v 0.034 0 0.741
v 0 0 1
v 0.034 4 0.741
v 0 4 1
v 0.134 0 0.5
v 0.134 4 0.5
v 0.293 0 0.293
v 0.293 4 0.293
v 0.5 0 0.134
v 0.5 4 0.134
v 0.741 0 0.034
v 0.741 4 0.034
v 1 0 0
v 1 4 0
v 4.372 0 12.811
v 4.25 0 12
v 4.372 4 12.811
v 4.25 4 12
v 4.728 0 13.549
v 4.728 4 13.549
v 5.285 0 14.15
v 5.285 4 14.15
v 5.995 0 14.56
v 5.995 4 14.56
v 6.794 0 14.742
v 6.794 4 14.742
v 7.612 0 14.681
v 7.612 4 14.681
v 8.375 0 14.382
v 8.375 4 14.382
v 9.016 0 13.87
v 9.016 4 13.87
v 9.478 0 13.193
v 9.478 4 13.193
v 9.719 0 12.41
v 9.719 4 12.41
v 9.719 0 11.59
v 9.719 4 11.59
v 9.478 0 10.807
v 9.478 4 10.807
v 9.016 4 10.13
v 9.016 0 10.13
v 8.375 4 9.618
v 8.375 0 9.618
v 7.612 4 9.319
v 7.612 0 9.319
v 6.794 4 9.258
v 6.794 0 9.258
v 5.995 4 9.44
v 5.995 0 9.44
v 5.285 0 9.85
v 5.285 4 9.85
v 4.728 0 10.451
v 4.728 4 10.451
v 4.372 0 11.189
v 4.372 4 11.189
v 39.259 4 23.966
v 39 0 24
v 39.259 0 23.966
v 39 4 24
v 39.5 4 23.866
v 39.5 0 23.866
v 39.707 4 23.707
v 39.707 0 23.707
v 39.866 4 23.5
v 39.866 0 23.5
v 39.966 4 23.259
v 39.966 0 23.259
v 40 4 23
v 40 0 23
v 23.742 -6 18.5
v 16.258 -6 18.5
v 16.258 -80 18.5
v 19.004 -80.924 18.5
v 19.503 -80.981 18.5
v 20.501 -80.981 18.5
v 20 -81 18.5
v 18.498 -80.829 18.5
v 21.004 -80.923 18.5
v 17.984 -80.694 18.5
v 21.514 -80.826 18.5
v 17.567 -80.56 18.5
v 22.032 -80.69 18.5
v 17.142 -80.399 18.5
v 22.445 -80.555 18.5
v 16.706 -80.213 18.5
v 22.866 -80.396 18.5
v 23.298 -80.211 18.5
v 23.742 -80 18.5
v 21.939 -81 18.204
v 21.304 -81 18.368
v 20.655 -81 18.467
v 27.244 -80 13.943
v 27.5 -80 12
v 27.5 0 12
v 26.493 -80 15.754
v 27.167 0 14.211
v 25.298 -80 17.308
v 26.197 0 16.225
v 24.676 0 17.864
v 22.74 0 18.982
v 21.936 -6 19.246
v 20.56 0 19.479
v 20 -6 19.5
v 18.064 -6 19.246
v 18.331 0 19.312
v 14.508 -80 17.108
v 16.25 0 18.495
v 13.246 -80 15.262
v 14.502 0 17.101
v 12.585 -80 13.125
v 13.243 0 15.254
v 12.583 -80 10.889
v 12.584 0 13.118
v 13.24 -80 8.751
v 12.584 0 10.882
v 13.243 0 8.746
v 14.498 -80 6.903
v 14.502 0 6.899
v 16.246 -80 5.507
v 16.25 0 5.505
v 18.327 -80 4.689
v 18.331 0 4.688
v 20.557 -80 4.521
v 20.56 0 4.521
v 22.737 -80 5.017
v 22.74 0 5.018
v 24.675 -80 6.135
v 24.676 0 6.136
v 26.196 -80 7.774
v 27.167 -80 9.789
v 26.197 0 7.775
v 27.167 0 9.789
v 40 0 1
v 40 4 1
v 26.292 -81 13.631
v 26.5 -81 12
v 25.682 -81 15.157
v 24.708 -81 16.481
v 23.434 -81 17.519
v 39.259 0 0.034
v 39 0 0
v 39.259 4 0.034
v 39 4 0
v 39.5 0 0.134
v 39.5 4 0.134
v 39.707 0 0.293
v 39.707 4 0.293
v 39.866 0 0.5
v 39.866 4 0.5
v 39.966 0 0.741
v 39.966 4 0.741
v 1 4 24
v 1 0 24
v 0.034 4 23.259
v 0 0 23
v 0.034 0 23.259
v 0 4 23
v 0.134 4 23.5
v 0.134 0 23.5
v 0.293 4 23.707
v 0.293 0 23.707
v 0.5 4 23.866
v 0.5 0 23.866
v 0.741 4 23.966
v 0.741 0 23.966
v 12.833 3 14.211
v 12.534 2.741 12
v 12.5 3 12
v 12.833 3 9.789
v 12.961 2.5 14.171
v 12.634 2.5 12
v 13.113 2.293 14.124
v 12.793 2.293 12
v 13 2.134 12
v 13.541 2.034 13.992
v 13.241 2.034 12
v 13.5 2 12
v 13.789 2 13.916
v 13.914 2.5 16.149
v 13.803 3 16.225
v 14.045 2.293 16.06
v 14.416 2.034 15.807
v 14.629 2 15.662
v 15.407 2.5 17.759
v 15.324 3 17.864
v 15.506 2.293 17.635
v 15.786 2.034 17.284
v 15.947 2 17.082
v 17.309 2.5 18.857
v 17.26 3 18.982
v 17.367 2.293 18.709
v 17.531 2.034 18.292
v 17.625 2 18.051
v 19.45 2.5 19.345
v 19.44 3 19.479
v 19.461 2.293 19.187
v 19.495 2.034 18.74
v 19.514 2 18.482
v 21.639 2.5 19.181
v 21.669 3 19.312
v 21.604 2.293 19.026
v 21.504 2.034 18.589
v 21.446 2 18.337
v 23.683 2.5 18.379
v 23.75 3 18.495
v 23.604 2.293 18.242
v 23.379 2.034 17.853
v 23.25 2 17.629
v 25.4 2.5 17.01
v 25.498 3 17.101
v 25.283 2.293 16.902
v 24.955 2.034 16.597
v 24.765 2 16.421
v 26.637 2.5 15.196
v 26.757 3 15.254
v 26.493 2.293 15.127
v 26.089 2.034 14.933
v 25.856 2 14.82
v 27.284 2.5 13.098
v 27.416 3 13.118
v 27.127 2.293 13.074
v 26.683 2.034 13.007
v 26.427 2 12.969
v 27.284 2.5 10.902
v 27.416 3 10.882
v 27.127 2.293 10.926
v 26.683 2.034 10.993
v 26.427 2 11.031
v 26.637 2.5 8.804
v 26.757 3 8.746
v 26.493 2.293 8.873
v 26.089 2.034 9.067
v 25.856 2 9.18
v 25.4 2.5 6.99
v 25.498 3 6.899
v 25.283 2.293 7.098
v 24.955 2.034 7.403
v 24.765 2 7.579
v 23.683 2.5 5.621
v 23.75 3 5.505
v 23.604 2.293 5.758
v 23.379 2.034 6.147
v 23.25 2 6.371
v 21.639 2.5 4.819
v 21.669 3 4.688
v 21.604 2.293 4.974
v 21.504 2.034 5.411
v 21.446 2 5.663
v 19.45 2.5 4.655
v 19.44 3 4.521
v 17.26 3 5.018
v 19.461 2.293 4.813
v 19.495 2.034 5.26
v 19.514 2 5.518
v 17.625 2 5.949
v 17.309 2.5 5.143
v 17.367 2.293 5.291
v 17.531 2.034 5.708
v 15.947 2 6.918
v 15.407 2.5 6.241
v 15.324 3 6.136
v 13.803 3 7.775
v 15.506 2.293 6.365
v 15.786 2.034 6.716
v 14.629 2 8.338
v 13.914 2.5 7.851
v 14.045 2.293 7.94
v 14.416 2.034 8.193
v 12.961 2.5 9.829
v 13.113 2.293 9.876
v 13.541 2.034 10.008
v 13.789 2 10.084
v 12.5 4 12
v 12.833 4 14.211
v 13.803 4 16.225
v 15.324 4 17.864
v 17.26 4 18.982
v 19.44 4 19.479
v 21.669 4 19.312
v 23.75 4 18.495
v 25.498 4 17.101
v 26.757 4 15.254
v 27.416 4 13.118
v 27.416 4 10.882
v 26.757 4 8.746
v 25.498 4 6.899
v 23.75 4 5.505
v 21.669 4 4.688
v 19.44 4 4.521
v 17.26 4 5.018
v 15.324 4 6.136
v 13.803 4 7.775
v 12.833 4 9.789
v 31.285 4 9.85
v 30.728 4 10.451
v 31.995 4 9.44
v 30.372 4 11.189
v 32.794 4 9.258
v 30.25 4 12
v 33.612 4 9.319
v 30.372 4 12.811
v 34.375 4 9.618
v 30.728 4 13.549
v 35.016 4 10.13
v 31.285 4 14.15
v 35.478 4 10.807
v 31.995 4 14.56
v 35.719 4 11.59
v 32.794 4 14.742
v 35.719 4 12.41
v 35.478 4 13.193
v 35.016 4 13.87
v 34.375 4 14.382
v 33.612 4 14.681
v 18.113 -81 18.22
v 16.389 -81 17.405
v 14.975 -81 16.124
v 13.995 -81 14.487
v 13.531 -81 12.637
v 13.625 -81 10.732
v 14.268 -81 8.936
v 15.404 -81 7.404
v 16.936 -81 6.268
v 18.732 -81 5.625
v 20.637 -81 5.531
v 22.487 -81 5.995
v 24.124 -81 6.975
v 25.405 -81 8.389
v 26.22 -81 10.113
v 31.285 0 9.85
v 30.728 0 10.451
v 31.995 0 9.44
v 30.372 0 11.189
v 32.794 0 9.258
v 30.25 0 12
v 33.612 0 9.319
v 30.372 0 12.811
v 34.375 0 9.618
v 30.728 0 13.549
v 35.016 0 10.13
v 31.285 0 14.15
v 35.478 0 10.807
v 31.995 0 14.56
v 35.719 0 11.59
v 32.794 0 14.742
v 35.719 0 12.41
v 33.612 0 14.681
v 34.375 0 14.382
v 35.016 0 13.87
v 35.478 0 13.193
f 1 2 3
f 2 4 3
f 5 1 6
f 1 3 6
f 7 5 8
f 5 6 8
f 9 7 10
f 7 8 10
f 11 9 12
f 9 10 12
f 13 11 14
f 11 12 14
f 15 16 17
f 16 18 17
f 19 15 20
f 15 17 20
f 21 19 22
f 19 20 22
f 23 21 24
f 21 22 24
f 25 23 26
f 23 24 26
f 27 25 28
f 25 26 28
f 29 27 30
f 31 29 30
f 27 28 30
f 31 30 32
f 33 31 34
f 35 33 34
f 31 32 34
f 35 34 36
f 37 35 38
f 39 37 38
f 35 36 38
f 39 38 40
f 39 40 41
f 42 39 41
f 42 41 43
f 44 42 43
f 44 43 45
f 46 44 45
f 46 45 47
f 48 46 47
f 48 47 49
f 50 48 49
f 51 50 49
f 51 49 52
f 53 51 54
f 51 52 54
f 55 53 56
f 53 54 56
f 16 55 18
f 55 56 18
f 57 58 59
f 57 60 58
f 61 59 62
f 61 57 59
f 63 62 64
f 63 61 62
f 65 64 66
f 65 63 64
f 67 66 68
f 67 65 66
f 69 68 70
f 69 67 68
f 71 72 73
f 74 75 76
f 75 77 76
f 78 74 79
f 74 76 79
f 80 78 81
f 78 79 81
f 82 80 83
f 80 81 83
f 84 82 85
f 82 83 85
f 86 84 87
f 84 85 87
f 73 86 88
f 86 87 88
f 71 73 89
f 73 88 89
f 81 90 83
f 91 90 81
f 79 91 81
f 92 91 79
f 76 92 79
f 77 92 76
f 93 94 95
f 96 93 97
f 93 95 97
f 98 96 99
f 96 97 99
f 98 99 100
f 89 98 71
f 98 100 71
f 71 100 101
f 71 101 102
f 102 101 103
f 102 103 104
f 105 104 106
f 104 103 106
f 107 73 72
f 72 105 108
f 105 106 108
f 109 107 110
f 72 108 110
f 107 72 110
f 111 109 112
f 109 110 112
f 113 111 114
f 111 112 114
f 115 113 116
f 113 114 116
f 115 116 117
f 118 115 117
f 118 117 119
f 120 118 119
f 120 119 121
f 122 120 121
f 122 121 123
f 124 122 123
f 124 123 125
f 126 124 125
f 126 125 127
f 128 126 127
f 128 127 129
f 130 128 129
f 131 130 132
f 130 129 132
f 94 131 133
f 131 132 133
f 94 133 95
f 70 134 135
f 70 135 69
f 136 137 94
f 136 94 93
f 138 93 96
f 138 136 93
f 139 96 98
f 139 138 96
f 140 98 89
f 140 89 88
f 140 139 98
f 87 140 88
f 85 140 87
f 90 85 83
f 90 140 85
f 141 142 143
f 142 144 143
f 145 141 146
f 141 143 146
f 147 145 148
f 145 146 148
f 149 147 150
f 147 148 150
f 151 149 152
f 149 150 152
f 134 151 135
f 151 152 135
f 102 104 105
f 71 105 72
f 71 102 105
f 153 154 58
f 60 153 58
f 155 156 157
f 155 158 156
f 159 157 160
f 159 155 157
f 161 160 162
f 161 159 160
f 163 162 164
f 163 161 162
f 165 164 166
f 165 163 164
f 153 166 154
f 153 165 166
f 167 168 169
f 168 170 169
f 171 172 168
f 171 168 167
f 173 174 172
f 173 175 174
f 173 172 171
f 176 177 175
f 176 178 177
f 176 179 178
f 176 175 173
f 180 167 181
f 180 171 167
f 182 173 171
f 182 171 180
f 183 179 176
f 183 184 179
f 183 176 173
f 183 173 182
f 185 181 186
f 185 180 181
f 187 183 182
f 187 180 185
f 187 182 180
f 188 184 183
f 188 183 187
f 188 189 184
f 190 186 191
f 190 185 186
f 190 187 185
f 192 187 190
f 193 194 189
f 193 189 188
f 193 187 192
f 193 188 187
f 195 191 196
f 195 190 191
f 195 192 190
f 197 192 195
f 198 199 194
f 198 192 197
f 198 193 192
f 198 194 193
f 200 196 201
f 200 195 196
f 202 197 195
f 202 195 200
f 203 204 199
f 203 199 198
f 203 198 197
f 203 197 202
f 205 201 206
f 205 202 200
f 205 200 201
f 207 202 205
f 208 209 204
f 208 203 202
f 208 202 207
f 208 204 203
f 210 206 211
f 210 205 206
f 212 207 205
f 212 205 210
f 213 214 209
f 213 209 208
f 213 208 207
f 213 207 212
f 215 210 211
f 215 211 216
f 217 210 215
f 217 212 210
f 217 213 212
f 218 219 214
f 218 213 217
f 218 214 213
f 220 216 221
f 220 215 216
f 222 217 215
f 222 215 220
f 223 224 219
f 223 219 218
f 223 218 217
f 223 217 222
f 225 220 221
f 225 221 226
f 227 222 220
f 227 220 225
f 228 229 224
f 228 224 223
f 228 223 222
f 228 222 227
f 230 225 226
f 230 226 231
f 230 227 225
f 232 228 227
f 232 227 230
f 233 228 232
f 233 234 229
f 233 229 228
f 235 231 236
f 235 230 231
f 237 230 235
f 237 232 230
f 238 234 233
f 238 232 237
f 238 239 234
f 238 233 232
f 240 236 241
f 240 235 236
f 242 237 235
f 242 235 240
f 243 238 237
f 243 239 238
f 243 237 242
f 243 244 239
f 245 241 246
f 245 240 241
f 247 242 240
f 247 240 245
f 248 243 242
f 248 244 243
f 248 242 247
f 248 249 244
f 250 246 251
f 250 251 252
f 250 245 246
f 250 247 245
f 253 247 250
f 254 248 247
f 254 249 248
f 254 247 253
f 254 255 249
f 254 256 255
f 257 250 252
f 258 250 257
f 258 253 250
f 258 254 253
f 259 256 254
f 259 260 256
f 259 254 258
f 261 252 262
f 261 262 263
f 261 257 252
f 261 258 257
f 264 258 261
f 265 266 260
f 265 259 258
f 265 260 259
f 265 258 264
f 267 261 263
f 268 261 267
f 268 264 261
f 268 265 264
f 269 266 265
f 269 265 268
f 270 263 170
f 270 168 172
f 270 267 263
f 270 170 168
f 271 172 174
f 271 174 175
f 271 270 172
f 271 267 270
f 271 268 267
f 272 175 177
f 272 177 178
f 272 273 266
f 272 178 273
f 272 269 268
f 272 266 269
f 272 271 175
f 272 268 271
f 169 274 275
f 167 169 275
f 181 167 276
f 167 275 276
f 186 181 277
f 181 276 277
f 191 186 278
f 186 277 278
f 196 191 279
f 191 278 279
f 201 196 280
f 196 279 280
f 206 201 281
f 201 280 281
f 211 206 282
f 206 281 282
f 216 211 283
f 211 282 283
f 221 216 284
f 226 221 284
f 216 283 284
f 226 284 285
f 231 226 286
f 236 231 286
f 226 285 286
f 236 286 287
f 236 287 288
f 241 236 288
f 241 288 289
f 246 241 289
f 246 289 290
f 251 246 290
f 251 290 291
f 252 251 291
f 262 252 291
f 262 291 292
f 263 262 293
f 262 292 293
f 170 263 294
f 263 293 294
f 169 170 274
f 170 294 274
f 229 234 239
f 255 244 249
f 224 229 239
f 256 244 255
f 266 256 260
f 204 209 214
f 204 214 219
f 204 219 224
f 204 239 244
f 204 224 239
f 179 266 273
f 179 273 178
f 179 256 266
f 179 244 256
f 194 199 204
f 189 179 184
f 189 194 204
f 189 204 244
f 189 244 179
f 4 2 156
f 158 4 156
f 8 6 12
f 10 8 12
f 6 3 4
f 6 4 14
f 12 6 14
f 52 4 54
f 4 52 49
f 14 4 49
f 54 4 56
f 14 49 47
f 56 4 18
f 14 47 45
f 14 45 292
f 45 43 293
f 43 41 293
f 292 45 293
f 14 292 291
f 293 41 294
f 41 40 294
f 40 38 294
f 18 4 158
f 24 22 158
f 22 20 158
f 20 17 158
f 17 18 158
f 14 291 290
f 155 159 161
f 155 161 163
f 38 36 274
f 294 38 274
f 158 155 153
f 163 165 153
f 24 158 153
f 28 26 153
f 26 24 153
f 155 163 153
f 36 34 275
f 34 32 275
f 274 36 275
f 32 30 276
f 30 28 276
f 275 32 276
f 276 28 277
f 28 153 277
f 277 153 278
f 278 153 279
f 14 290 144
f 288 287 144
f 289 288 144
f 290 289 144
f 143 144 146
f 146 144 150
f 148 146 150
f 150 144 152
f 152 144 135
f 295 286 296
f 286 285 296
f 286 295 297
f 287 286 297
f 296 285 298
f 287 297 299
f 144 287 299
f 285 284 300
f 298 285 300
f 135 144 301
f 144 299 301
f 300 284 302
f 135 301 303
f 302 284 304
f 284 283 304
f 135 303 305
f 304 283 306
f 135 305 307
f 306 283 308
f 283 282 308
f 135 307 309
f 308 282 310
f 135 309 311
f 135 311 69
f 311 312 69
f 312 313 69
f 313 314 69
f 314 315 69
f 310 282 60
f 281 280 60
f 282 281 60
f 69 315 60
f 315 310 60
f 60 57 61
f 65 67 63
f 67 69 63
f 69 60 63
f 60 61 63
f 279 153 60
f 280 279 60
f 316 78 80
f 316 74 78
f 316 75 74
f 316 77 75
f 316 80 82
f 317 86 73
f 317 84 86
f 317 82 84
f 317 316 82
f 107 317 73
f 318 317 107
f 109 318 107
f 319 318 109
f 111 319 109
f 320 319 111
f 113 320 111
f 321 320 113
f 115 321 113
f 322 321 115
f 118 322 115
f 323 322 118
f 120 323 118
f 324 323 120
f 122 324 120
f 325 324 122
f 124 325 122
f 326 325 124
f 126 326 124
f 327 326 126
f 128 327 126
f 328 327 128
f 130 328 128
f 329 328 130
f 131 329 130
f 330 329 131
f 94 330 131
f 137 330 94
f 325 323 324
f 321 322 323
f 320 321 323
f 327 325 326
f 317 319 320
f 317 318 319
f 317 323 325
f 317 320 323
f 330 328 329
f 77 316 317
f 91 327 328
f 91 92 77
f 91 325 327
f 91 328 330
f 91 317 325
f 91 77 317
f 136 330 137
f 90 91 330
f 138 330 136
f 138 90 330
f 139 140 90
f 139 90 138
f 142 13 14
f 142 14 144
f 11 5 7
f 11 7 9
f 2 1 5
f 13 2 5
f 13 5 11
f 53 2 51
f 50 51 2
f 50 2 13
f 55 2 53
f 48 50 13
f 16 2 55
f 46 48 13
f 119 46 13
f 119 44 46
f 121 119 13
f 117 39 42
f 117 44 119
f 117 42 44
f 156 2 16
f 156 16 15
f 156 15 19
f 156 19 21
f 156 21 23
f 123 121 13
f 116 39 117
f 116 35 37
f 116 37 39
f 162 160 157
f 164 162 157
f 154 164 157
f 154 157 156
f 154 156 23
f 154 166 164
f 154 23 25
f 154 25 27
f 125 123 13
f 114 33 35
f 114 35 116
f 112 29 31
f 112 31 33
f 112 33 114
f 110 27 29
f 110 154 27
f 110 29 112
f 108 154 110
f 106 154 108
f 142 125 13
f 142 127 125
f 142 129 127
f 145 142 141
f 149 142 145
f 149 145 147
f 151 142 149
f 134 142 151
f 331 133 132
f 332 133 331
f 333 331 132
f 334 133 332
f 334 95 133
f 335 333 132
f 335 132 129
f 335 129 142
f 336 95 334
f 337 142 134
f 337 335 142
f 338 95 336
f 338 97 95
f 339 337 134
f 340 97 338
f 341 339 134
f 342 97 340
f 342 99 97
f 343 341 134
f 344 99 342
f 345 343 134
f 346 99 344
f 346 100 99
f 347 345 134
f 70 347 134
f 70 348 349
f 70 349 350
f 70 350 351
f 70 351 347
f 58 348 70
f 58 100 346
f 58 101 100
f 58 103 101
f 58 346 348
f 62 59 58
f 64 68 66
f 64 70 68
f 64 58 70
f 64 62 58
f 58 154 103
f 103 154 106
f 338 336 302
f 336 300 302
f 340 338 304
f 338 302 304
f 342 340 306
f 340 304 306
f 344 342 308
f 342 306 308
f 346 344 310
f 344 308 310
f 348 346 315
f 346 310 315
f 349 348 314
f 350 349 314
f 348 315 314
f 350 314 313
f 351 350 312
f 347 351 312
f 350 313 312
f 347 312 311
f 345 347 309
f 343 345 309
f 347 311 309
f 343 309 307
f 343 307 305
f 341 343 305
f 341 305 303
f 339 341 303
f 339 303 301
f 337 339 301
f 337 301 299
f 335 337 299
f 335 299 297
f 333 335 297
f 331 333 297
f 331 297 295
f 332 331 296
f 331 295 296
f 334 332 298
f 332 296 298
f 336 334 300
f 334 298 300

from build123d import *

# Parameters (mm, degrees)
F0_W        = 40
F0_H        = 24
F0_R        = 2.5
F0_R_2      = 7.5
F1_DEPTH    = 4
F3_DEPTH    = 81
F4_D        = 5.5
F4_DEPTH    = 4
F4_TIP      = 1.6523667023
F6_DEPTH    = 75
F7_T2_ANGLE = 287.359476763
F7_T4_ANGLE = 107.2329087186
F8_R        = 7.5
F9_DEPTH    = 2
F10_R       = 1


# Not quite as in the source:
# - a fillet or chamfer that OpenCascade refuses, or shapes differently, is made with other operations: its cross-section is extruded or revolved along the edge and cut away or added


with BuildPart() as f1:
    # F0 (on Front) → F1 (new body)
    with BuildSketch(Plane.XZ):
        with Locations((20, 12)):
            Rectangle(F0_W, F0_H)
        with Locations((7, 12)):
            Circle(F0_R, mode=Mode.SUBTRACT)
        with Locations((20, 12)):
            Circle(F0_R_2, mode=Mode.SUBTRACT)
        with Locations((33, 12)):
            Circle(F0_R, mode=Mode.SUBTRACT)
        with Locations((20, 12)):
            Circle(F0_R_2)
        with Locations((7, 12)):
            Circle(F0_R)
        with Locations((33, 12)):
            Circle(F0_R)
    extrude(amount=-F1_DEPTH)

    # F0 (on Front) → F3 (join)
    with BuildSketch(Plane.XZ):
        with Locations((20, 12)):
            Circle(F0_R_2)
    extrude(amount=F3_DEPTH)

    # F4
    with Locations(Plane.XZ):
        with Locations((33, 12), (7, 12)):
            Hole(F4_D / 2, depth=F4_DEPTH)
            with Locations((0, 0, -(F4_DEPTH + F4_TIP / 2))):  # 118° drill point
                Cone(0, F4_D / 2, F4_TIP, mode=Mode.SUBTRACT)

    # F5 (on face) → F6 (cut)
    with BuildSketch(Plane.XZ.offset(81)):
        with BuildLine():
            ThreePointArc((23.7416573868, 18.5), (20, 19.5), (16.2583426132, 18.5))
            Line((16.2583426132, 18.5), (23.7416573868, 18.5))
        make_face()
    extrude(amount=-F6_DEPTH, mode=Mode.SUBTRACT)

    # F7: chamfer of 1 on 2 edges, made by hand

    # F7_s1 → F7_t2 (revolve, cut)
    with BuildSketch(Plane(origin=(14.8022480235, 0, -4.6272486525), x_dir=(0, 1, 0), z_dir=(0.9544515906, 0, -0.2983658178))):
        with BuildLine():
            Line((-79.9717157288, 24.9490197138), (-81.0282842712, 23.8924511713))
            Line((-81.0282842712, 23.8924511713), (-81.0482842712, 23.8924511713))
            ThreePointArc((-81.0482842712, 23.8924511713), (-81.02, 24.406593307), (-81.02, 24.9207354426))
            Line((-81.02, 24.9207354426), (-81, 24.9407354426))
            ThreePointArc((-81, 24.9407354426), (-80.4858578644, 24.9407354426), (-79.9717157288, 24.9690197138))
            Line((-79.9717157288, 24.9690197138), (-79.9717157288, 24.9490197138))
        make_face()
    revolve(axis=Axis((20, -81, 12), (0, -1, 0)), revolution_arc=F7_T2_ANGLE, mode=Mode.SUBTRACT)

    # F7_s3 → F7_t4 (revolve, cut)
    with BuildSketch(Plane.XY.offset(12)):
        with BuildLine():
            Line((27.5282842712, -79.9717157288), (26.4717157288, -81.0282842712))
            Line((26.4717157288, -81.0282842712), (26.4717157288, -81.0482842712))
            ThreePointArc((26.4717157288, -81.0482842712), (26.9858578644, -81.02), (27.5, -81.02))
            Line((27.5, -81.02), (27.52, -81))
            ThreePointArc((27.52, -81), (27.52, -80.4858578644), (27.5482842712, -79.9717157288))
            Line((27.5482842712, -79.9717157288), (27.5282842712, -79.9717157288))
        make_face()
    revolve(axis=Axis((20, -81, 12), (0, -1, 0)), revolution_arc=F7_T4_ANGLE, mode=Mode.SUBTRACT)

    # F8 (on face) → F9 (cut)
    with BuildSketch(Plane(origin=(0, 4, 0), x_dir=(-1, 0, 0), z_dir=(0, 1, 0))):
        with Locations((-20, 12)):
            Circle(F8_R)
    extrude(amount=-F9_DEPTH, mode=Mode.SUBTRACT)

    # F10
    f10_edges = [f1.edges().sort_by_distance(p)[0] for p in [
        (0, 2, 24),
        (0, 2, 0),
        (40, 2, 0),
        (40, 2, 24),
        (27.5, 2, 12),
    ]]
    fillet(f10_edges, radius=F10_R)


solid = f1.part
